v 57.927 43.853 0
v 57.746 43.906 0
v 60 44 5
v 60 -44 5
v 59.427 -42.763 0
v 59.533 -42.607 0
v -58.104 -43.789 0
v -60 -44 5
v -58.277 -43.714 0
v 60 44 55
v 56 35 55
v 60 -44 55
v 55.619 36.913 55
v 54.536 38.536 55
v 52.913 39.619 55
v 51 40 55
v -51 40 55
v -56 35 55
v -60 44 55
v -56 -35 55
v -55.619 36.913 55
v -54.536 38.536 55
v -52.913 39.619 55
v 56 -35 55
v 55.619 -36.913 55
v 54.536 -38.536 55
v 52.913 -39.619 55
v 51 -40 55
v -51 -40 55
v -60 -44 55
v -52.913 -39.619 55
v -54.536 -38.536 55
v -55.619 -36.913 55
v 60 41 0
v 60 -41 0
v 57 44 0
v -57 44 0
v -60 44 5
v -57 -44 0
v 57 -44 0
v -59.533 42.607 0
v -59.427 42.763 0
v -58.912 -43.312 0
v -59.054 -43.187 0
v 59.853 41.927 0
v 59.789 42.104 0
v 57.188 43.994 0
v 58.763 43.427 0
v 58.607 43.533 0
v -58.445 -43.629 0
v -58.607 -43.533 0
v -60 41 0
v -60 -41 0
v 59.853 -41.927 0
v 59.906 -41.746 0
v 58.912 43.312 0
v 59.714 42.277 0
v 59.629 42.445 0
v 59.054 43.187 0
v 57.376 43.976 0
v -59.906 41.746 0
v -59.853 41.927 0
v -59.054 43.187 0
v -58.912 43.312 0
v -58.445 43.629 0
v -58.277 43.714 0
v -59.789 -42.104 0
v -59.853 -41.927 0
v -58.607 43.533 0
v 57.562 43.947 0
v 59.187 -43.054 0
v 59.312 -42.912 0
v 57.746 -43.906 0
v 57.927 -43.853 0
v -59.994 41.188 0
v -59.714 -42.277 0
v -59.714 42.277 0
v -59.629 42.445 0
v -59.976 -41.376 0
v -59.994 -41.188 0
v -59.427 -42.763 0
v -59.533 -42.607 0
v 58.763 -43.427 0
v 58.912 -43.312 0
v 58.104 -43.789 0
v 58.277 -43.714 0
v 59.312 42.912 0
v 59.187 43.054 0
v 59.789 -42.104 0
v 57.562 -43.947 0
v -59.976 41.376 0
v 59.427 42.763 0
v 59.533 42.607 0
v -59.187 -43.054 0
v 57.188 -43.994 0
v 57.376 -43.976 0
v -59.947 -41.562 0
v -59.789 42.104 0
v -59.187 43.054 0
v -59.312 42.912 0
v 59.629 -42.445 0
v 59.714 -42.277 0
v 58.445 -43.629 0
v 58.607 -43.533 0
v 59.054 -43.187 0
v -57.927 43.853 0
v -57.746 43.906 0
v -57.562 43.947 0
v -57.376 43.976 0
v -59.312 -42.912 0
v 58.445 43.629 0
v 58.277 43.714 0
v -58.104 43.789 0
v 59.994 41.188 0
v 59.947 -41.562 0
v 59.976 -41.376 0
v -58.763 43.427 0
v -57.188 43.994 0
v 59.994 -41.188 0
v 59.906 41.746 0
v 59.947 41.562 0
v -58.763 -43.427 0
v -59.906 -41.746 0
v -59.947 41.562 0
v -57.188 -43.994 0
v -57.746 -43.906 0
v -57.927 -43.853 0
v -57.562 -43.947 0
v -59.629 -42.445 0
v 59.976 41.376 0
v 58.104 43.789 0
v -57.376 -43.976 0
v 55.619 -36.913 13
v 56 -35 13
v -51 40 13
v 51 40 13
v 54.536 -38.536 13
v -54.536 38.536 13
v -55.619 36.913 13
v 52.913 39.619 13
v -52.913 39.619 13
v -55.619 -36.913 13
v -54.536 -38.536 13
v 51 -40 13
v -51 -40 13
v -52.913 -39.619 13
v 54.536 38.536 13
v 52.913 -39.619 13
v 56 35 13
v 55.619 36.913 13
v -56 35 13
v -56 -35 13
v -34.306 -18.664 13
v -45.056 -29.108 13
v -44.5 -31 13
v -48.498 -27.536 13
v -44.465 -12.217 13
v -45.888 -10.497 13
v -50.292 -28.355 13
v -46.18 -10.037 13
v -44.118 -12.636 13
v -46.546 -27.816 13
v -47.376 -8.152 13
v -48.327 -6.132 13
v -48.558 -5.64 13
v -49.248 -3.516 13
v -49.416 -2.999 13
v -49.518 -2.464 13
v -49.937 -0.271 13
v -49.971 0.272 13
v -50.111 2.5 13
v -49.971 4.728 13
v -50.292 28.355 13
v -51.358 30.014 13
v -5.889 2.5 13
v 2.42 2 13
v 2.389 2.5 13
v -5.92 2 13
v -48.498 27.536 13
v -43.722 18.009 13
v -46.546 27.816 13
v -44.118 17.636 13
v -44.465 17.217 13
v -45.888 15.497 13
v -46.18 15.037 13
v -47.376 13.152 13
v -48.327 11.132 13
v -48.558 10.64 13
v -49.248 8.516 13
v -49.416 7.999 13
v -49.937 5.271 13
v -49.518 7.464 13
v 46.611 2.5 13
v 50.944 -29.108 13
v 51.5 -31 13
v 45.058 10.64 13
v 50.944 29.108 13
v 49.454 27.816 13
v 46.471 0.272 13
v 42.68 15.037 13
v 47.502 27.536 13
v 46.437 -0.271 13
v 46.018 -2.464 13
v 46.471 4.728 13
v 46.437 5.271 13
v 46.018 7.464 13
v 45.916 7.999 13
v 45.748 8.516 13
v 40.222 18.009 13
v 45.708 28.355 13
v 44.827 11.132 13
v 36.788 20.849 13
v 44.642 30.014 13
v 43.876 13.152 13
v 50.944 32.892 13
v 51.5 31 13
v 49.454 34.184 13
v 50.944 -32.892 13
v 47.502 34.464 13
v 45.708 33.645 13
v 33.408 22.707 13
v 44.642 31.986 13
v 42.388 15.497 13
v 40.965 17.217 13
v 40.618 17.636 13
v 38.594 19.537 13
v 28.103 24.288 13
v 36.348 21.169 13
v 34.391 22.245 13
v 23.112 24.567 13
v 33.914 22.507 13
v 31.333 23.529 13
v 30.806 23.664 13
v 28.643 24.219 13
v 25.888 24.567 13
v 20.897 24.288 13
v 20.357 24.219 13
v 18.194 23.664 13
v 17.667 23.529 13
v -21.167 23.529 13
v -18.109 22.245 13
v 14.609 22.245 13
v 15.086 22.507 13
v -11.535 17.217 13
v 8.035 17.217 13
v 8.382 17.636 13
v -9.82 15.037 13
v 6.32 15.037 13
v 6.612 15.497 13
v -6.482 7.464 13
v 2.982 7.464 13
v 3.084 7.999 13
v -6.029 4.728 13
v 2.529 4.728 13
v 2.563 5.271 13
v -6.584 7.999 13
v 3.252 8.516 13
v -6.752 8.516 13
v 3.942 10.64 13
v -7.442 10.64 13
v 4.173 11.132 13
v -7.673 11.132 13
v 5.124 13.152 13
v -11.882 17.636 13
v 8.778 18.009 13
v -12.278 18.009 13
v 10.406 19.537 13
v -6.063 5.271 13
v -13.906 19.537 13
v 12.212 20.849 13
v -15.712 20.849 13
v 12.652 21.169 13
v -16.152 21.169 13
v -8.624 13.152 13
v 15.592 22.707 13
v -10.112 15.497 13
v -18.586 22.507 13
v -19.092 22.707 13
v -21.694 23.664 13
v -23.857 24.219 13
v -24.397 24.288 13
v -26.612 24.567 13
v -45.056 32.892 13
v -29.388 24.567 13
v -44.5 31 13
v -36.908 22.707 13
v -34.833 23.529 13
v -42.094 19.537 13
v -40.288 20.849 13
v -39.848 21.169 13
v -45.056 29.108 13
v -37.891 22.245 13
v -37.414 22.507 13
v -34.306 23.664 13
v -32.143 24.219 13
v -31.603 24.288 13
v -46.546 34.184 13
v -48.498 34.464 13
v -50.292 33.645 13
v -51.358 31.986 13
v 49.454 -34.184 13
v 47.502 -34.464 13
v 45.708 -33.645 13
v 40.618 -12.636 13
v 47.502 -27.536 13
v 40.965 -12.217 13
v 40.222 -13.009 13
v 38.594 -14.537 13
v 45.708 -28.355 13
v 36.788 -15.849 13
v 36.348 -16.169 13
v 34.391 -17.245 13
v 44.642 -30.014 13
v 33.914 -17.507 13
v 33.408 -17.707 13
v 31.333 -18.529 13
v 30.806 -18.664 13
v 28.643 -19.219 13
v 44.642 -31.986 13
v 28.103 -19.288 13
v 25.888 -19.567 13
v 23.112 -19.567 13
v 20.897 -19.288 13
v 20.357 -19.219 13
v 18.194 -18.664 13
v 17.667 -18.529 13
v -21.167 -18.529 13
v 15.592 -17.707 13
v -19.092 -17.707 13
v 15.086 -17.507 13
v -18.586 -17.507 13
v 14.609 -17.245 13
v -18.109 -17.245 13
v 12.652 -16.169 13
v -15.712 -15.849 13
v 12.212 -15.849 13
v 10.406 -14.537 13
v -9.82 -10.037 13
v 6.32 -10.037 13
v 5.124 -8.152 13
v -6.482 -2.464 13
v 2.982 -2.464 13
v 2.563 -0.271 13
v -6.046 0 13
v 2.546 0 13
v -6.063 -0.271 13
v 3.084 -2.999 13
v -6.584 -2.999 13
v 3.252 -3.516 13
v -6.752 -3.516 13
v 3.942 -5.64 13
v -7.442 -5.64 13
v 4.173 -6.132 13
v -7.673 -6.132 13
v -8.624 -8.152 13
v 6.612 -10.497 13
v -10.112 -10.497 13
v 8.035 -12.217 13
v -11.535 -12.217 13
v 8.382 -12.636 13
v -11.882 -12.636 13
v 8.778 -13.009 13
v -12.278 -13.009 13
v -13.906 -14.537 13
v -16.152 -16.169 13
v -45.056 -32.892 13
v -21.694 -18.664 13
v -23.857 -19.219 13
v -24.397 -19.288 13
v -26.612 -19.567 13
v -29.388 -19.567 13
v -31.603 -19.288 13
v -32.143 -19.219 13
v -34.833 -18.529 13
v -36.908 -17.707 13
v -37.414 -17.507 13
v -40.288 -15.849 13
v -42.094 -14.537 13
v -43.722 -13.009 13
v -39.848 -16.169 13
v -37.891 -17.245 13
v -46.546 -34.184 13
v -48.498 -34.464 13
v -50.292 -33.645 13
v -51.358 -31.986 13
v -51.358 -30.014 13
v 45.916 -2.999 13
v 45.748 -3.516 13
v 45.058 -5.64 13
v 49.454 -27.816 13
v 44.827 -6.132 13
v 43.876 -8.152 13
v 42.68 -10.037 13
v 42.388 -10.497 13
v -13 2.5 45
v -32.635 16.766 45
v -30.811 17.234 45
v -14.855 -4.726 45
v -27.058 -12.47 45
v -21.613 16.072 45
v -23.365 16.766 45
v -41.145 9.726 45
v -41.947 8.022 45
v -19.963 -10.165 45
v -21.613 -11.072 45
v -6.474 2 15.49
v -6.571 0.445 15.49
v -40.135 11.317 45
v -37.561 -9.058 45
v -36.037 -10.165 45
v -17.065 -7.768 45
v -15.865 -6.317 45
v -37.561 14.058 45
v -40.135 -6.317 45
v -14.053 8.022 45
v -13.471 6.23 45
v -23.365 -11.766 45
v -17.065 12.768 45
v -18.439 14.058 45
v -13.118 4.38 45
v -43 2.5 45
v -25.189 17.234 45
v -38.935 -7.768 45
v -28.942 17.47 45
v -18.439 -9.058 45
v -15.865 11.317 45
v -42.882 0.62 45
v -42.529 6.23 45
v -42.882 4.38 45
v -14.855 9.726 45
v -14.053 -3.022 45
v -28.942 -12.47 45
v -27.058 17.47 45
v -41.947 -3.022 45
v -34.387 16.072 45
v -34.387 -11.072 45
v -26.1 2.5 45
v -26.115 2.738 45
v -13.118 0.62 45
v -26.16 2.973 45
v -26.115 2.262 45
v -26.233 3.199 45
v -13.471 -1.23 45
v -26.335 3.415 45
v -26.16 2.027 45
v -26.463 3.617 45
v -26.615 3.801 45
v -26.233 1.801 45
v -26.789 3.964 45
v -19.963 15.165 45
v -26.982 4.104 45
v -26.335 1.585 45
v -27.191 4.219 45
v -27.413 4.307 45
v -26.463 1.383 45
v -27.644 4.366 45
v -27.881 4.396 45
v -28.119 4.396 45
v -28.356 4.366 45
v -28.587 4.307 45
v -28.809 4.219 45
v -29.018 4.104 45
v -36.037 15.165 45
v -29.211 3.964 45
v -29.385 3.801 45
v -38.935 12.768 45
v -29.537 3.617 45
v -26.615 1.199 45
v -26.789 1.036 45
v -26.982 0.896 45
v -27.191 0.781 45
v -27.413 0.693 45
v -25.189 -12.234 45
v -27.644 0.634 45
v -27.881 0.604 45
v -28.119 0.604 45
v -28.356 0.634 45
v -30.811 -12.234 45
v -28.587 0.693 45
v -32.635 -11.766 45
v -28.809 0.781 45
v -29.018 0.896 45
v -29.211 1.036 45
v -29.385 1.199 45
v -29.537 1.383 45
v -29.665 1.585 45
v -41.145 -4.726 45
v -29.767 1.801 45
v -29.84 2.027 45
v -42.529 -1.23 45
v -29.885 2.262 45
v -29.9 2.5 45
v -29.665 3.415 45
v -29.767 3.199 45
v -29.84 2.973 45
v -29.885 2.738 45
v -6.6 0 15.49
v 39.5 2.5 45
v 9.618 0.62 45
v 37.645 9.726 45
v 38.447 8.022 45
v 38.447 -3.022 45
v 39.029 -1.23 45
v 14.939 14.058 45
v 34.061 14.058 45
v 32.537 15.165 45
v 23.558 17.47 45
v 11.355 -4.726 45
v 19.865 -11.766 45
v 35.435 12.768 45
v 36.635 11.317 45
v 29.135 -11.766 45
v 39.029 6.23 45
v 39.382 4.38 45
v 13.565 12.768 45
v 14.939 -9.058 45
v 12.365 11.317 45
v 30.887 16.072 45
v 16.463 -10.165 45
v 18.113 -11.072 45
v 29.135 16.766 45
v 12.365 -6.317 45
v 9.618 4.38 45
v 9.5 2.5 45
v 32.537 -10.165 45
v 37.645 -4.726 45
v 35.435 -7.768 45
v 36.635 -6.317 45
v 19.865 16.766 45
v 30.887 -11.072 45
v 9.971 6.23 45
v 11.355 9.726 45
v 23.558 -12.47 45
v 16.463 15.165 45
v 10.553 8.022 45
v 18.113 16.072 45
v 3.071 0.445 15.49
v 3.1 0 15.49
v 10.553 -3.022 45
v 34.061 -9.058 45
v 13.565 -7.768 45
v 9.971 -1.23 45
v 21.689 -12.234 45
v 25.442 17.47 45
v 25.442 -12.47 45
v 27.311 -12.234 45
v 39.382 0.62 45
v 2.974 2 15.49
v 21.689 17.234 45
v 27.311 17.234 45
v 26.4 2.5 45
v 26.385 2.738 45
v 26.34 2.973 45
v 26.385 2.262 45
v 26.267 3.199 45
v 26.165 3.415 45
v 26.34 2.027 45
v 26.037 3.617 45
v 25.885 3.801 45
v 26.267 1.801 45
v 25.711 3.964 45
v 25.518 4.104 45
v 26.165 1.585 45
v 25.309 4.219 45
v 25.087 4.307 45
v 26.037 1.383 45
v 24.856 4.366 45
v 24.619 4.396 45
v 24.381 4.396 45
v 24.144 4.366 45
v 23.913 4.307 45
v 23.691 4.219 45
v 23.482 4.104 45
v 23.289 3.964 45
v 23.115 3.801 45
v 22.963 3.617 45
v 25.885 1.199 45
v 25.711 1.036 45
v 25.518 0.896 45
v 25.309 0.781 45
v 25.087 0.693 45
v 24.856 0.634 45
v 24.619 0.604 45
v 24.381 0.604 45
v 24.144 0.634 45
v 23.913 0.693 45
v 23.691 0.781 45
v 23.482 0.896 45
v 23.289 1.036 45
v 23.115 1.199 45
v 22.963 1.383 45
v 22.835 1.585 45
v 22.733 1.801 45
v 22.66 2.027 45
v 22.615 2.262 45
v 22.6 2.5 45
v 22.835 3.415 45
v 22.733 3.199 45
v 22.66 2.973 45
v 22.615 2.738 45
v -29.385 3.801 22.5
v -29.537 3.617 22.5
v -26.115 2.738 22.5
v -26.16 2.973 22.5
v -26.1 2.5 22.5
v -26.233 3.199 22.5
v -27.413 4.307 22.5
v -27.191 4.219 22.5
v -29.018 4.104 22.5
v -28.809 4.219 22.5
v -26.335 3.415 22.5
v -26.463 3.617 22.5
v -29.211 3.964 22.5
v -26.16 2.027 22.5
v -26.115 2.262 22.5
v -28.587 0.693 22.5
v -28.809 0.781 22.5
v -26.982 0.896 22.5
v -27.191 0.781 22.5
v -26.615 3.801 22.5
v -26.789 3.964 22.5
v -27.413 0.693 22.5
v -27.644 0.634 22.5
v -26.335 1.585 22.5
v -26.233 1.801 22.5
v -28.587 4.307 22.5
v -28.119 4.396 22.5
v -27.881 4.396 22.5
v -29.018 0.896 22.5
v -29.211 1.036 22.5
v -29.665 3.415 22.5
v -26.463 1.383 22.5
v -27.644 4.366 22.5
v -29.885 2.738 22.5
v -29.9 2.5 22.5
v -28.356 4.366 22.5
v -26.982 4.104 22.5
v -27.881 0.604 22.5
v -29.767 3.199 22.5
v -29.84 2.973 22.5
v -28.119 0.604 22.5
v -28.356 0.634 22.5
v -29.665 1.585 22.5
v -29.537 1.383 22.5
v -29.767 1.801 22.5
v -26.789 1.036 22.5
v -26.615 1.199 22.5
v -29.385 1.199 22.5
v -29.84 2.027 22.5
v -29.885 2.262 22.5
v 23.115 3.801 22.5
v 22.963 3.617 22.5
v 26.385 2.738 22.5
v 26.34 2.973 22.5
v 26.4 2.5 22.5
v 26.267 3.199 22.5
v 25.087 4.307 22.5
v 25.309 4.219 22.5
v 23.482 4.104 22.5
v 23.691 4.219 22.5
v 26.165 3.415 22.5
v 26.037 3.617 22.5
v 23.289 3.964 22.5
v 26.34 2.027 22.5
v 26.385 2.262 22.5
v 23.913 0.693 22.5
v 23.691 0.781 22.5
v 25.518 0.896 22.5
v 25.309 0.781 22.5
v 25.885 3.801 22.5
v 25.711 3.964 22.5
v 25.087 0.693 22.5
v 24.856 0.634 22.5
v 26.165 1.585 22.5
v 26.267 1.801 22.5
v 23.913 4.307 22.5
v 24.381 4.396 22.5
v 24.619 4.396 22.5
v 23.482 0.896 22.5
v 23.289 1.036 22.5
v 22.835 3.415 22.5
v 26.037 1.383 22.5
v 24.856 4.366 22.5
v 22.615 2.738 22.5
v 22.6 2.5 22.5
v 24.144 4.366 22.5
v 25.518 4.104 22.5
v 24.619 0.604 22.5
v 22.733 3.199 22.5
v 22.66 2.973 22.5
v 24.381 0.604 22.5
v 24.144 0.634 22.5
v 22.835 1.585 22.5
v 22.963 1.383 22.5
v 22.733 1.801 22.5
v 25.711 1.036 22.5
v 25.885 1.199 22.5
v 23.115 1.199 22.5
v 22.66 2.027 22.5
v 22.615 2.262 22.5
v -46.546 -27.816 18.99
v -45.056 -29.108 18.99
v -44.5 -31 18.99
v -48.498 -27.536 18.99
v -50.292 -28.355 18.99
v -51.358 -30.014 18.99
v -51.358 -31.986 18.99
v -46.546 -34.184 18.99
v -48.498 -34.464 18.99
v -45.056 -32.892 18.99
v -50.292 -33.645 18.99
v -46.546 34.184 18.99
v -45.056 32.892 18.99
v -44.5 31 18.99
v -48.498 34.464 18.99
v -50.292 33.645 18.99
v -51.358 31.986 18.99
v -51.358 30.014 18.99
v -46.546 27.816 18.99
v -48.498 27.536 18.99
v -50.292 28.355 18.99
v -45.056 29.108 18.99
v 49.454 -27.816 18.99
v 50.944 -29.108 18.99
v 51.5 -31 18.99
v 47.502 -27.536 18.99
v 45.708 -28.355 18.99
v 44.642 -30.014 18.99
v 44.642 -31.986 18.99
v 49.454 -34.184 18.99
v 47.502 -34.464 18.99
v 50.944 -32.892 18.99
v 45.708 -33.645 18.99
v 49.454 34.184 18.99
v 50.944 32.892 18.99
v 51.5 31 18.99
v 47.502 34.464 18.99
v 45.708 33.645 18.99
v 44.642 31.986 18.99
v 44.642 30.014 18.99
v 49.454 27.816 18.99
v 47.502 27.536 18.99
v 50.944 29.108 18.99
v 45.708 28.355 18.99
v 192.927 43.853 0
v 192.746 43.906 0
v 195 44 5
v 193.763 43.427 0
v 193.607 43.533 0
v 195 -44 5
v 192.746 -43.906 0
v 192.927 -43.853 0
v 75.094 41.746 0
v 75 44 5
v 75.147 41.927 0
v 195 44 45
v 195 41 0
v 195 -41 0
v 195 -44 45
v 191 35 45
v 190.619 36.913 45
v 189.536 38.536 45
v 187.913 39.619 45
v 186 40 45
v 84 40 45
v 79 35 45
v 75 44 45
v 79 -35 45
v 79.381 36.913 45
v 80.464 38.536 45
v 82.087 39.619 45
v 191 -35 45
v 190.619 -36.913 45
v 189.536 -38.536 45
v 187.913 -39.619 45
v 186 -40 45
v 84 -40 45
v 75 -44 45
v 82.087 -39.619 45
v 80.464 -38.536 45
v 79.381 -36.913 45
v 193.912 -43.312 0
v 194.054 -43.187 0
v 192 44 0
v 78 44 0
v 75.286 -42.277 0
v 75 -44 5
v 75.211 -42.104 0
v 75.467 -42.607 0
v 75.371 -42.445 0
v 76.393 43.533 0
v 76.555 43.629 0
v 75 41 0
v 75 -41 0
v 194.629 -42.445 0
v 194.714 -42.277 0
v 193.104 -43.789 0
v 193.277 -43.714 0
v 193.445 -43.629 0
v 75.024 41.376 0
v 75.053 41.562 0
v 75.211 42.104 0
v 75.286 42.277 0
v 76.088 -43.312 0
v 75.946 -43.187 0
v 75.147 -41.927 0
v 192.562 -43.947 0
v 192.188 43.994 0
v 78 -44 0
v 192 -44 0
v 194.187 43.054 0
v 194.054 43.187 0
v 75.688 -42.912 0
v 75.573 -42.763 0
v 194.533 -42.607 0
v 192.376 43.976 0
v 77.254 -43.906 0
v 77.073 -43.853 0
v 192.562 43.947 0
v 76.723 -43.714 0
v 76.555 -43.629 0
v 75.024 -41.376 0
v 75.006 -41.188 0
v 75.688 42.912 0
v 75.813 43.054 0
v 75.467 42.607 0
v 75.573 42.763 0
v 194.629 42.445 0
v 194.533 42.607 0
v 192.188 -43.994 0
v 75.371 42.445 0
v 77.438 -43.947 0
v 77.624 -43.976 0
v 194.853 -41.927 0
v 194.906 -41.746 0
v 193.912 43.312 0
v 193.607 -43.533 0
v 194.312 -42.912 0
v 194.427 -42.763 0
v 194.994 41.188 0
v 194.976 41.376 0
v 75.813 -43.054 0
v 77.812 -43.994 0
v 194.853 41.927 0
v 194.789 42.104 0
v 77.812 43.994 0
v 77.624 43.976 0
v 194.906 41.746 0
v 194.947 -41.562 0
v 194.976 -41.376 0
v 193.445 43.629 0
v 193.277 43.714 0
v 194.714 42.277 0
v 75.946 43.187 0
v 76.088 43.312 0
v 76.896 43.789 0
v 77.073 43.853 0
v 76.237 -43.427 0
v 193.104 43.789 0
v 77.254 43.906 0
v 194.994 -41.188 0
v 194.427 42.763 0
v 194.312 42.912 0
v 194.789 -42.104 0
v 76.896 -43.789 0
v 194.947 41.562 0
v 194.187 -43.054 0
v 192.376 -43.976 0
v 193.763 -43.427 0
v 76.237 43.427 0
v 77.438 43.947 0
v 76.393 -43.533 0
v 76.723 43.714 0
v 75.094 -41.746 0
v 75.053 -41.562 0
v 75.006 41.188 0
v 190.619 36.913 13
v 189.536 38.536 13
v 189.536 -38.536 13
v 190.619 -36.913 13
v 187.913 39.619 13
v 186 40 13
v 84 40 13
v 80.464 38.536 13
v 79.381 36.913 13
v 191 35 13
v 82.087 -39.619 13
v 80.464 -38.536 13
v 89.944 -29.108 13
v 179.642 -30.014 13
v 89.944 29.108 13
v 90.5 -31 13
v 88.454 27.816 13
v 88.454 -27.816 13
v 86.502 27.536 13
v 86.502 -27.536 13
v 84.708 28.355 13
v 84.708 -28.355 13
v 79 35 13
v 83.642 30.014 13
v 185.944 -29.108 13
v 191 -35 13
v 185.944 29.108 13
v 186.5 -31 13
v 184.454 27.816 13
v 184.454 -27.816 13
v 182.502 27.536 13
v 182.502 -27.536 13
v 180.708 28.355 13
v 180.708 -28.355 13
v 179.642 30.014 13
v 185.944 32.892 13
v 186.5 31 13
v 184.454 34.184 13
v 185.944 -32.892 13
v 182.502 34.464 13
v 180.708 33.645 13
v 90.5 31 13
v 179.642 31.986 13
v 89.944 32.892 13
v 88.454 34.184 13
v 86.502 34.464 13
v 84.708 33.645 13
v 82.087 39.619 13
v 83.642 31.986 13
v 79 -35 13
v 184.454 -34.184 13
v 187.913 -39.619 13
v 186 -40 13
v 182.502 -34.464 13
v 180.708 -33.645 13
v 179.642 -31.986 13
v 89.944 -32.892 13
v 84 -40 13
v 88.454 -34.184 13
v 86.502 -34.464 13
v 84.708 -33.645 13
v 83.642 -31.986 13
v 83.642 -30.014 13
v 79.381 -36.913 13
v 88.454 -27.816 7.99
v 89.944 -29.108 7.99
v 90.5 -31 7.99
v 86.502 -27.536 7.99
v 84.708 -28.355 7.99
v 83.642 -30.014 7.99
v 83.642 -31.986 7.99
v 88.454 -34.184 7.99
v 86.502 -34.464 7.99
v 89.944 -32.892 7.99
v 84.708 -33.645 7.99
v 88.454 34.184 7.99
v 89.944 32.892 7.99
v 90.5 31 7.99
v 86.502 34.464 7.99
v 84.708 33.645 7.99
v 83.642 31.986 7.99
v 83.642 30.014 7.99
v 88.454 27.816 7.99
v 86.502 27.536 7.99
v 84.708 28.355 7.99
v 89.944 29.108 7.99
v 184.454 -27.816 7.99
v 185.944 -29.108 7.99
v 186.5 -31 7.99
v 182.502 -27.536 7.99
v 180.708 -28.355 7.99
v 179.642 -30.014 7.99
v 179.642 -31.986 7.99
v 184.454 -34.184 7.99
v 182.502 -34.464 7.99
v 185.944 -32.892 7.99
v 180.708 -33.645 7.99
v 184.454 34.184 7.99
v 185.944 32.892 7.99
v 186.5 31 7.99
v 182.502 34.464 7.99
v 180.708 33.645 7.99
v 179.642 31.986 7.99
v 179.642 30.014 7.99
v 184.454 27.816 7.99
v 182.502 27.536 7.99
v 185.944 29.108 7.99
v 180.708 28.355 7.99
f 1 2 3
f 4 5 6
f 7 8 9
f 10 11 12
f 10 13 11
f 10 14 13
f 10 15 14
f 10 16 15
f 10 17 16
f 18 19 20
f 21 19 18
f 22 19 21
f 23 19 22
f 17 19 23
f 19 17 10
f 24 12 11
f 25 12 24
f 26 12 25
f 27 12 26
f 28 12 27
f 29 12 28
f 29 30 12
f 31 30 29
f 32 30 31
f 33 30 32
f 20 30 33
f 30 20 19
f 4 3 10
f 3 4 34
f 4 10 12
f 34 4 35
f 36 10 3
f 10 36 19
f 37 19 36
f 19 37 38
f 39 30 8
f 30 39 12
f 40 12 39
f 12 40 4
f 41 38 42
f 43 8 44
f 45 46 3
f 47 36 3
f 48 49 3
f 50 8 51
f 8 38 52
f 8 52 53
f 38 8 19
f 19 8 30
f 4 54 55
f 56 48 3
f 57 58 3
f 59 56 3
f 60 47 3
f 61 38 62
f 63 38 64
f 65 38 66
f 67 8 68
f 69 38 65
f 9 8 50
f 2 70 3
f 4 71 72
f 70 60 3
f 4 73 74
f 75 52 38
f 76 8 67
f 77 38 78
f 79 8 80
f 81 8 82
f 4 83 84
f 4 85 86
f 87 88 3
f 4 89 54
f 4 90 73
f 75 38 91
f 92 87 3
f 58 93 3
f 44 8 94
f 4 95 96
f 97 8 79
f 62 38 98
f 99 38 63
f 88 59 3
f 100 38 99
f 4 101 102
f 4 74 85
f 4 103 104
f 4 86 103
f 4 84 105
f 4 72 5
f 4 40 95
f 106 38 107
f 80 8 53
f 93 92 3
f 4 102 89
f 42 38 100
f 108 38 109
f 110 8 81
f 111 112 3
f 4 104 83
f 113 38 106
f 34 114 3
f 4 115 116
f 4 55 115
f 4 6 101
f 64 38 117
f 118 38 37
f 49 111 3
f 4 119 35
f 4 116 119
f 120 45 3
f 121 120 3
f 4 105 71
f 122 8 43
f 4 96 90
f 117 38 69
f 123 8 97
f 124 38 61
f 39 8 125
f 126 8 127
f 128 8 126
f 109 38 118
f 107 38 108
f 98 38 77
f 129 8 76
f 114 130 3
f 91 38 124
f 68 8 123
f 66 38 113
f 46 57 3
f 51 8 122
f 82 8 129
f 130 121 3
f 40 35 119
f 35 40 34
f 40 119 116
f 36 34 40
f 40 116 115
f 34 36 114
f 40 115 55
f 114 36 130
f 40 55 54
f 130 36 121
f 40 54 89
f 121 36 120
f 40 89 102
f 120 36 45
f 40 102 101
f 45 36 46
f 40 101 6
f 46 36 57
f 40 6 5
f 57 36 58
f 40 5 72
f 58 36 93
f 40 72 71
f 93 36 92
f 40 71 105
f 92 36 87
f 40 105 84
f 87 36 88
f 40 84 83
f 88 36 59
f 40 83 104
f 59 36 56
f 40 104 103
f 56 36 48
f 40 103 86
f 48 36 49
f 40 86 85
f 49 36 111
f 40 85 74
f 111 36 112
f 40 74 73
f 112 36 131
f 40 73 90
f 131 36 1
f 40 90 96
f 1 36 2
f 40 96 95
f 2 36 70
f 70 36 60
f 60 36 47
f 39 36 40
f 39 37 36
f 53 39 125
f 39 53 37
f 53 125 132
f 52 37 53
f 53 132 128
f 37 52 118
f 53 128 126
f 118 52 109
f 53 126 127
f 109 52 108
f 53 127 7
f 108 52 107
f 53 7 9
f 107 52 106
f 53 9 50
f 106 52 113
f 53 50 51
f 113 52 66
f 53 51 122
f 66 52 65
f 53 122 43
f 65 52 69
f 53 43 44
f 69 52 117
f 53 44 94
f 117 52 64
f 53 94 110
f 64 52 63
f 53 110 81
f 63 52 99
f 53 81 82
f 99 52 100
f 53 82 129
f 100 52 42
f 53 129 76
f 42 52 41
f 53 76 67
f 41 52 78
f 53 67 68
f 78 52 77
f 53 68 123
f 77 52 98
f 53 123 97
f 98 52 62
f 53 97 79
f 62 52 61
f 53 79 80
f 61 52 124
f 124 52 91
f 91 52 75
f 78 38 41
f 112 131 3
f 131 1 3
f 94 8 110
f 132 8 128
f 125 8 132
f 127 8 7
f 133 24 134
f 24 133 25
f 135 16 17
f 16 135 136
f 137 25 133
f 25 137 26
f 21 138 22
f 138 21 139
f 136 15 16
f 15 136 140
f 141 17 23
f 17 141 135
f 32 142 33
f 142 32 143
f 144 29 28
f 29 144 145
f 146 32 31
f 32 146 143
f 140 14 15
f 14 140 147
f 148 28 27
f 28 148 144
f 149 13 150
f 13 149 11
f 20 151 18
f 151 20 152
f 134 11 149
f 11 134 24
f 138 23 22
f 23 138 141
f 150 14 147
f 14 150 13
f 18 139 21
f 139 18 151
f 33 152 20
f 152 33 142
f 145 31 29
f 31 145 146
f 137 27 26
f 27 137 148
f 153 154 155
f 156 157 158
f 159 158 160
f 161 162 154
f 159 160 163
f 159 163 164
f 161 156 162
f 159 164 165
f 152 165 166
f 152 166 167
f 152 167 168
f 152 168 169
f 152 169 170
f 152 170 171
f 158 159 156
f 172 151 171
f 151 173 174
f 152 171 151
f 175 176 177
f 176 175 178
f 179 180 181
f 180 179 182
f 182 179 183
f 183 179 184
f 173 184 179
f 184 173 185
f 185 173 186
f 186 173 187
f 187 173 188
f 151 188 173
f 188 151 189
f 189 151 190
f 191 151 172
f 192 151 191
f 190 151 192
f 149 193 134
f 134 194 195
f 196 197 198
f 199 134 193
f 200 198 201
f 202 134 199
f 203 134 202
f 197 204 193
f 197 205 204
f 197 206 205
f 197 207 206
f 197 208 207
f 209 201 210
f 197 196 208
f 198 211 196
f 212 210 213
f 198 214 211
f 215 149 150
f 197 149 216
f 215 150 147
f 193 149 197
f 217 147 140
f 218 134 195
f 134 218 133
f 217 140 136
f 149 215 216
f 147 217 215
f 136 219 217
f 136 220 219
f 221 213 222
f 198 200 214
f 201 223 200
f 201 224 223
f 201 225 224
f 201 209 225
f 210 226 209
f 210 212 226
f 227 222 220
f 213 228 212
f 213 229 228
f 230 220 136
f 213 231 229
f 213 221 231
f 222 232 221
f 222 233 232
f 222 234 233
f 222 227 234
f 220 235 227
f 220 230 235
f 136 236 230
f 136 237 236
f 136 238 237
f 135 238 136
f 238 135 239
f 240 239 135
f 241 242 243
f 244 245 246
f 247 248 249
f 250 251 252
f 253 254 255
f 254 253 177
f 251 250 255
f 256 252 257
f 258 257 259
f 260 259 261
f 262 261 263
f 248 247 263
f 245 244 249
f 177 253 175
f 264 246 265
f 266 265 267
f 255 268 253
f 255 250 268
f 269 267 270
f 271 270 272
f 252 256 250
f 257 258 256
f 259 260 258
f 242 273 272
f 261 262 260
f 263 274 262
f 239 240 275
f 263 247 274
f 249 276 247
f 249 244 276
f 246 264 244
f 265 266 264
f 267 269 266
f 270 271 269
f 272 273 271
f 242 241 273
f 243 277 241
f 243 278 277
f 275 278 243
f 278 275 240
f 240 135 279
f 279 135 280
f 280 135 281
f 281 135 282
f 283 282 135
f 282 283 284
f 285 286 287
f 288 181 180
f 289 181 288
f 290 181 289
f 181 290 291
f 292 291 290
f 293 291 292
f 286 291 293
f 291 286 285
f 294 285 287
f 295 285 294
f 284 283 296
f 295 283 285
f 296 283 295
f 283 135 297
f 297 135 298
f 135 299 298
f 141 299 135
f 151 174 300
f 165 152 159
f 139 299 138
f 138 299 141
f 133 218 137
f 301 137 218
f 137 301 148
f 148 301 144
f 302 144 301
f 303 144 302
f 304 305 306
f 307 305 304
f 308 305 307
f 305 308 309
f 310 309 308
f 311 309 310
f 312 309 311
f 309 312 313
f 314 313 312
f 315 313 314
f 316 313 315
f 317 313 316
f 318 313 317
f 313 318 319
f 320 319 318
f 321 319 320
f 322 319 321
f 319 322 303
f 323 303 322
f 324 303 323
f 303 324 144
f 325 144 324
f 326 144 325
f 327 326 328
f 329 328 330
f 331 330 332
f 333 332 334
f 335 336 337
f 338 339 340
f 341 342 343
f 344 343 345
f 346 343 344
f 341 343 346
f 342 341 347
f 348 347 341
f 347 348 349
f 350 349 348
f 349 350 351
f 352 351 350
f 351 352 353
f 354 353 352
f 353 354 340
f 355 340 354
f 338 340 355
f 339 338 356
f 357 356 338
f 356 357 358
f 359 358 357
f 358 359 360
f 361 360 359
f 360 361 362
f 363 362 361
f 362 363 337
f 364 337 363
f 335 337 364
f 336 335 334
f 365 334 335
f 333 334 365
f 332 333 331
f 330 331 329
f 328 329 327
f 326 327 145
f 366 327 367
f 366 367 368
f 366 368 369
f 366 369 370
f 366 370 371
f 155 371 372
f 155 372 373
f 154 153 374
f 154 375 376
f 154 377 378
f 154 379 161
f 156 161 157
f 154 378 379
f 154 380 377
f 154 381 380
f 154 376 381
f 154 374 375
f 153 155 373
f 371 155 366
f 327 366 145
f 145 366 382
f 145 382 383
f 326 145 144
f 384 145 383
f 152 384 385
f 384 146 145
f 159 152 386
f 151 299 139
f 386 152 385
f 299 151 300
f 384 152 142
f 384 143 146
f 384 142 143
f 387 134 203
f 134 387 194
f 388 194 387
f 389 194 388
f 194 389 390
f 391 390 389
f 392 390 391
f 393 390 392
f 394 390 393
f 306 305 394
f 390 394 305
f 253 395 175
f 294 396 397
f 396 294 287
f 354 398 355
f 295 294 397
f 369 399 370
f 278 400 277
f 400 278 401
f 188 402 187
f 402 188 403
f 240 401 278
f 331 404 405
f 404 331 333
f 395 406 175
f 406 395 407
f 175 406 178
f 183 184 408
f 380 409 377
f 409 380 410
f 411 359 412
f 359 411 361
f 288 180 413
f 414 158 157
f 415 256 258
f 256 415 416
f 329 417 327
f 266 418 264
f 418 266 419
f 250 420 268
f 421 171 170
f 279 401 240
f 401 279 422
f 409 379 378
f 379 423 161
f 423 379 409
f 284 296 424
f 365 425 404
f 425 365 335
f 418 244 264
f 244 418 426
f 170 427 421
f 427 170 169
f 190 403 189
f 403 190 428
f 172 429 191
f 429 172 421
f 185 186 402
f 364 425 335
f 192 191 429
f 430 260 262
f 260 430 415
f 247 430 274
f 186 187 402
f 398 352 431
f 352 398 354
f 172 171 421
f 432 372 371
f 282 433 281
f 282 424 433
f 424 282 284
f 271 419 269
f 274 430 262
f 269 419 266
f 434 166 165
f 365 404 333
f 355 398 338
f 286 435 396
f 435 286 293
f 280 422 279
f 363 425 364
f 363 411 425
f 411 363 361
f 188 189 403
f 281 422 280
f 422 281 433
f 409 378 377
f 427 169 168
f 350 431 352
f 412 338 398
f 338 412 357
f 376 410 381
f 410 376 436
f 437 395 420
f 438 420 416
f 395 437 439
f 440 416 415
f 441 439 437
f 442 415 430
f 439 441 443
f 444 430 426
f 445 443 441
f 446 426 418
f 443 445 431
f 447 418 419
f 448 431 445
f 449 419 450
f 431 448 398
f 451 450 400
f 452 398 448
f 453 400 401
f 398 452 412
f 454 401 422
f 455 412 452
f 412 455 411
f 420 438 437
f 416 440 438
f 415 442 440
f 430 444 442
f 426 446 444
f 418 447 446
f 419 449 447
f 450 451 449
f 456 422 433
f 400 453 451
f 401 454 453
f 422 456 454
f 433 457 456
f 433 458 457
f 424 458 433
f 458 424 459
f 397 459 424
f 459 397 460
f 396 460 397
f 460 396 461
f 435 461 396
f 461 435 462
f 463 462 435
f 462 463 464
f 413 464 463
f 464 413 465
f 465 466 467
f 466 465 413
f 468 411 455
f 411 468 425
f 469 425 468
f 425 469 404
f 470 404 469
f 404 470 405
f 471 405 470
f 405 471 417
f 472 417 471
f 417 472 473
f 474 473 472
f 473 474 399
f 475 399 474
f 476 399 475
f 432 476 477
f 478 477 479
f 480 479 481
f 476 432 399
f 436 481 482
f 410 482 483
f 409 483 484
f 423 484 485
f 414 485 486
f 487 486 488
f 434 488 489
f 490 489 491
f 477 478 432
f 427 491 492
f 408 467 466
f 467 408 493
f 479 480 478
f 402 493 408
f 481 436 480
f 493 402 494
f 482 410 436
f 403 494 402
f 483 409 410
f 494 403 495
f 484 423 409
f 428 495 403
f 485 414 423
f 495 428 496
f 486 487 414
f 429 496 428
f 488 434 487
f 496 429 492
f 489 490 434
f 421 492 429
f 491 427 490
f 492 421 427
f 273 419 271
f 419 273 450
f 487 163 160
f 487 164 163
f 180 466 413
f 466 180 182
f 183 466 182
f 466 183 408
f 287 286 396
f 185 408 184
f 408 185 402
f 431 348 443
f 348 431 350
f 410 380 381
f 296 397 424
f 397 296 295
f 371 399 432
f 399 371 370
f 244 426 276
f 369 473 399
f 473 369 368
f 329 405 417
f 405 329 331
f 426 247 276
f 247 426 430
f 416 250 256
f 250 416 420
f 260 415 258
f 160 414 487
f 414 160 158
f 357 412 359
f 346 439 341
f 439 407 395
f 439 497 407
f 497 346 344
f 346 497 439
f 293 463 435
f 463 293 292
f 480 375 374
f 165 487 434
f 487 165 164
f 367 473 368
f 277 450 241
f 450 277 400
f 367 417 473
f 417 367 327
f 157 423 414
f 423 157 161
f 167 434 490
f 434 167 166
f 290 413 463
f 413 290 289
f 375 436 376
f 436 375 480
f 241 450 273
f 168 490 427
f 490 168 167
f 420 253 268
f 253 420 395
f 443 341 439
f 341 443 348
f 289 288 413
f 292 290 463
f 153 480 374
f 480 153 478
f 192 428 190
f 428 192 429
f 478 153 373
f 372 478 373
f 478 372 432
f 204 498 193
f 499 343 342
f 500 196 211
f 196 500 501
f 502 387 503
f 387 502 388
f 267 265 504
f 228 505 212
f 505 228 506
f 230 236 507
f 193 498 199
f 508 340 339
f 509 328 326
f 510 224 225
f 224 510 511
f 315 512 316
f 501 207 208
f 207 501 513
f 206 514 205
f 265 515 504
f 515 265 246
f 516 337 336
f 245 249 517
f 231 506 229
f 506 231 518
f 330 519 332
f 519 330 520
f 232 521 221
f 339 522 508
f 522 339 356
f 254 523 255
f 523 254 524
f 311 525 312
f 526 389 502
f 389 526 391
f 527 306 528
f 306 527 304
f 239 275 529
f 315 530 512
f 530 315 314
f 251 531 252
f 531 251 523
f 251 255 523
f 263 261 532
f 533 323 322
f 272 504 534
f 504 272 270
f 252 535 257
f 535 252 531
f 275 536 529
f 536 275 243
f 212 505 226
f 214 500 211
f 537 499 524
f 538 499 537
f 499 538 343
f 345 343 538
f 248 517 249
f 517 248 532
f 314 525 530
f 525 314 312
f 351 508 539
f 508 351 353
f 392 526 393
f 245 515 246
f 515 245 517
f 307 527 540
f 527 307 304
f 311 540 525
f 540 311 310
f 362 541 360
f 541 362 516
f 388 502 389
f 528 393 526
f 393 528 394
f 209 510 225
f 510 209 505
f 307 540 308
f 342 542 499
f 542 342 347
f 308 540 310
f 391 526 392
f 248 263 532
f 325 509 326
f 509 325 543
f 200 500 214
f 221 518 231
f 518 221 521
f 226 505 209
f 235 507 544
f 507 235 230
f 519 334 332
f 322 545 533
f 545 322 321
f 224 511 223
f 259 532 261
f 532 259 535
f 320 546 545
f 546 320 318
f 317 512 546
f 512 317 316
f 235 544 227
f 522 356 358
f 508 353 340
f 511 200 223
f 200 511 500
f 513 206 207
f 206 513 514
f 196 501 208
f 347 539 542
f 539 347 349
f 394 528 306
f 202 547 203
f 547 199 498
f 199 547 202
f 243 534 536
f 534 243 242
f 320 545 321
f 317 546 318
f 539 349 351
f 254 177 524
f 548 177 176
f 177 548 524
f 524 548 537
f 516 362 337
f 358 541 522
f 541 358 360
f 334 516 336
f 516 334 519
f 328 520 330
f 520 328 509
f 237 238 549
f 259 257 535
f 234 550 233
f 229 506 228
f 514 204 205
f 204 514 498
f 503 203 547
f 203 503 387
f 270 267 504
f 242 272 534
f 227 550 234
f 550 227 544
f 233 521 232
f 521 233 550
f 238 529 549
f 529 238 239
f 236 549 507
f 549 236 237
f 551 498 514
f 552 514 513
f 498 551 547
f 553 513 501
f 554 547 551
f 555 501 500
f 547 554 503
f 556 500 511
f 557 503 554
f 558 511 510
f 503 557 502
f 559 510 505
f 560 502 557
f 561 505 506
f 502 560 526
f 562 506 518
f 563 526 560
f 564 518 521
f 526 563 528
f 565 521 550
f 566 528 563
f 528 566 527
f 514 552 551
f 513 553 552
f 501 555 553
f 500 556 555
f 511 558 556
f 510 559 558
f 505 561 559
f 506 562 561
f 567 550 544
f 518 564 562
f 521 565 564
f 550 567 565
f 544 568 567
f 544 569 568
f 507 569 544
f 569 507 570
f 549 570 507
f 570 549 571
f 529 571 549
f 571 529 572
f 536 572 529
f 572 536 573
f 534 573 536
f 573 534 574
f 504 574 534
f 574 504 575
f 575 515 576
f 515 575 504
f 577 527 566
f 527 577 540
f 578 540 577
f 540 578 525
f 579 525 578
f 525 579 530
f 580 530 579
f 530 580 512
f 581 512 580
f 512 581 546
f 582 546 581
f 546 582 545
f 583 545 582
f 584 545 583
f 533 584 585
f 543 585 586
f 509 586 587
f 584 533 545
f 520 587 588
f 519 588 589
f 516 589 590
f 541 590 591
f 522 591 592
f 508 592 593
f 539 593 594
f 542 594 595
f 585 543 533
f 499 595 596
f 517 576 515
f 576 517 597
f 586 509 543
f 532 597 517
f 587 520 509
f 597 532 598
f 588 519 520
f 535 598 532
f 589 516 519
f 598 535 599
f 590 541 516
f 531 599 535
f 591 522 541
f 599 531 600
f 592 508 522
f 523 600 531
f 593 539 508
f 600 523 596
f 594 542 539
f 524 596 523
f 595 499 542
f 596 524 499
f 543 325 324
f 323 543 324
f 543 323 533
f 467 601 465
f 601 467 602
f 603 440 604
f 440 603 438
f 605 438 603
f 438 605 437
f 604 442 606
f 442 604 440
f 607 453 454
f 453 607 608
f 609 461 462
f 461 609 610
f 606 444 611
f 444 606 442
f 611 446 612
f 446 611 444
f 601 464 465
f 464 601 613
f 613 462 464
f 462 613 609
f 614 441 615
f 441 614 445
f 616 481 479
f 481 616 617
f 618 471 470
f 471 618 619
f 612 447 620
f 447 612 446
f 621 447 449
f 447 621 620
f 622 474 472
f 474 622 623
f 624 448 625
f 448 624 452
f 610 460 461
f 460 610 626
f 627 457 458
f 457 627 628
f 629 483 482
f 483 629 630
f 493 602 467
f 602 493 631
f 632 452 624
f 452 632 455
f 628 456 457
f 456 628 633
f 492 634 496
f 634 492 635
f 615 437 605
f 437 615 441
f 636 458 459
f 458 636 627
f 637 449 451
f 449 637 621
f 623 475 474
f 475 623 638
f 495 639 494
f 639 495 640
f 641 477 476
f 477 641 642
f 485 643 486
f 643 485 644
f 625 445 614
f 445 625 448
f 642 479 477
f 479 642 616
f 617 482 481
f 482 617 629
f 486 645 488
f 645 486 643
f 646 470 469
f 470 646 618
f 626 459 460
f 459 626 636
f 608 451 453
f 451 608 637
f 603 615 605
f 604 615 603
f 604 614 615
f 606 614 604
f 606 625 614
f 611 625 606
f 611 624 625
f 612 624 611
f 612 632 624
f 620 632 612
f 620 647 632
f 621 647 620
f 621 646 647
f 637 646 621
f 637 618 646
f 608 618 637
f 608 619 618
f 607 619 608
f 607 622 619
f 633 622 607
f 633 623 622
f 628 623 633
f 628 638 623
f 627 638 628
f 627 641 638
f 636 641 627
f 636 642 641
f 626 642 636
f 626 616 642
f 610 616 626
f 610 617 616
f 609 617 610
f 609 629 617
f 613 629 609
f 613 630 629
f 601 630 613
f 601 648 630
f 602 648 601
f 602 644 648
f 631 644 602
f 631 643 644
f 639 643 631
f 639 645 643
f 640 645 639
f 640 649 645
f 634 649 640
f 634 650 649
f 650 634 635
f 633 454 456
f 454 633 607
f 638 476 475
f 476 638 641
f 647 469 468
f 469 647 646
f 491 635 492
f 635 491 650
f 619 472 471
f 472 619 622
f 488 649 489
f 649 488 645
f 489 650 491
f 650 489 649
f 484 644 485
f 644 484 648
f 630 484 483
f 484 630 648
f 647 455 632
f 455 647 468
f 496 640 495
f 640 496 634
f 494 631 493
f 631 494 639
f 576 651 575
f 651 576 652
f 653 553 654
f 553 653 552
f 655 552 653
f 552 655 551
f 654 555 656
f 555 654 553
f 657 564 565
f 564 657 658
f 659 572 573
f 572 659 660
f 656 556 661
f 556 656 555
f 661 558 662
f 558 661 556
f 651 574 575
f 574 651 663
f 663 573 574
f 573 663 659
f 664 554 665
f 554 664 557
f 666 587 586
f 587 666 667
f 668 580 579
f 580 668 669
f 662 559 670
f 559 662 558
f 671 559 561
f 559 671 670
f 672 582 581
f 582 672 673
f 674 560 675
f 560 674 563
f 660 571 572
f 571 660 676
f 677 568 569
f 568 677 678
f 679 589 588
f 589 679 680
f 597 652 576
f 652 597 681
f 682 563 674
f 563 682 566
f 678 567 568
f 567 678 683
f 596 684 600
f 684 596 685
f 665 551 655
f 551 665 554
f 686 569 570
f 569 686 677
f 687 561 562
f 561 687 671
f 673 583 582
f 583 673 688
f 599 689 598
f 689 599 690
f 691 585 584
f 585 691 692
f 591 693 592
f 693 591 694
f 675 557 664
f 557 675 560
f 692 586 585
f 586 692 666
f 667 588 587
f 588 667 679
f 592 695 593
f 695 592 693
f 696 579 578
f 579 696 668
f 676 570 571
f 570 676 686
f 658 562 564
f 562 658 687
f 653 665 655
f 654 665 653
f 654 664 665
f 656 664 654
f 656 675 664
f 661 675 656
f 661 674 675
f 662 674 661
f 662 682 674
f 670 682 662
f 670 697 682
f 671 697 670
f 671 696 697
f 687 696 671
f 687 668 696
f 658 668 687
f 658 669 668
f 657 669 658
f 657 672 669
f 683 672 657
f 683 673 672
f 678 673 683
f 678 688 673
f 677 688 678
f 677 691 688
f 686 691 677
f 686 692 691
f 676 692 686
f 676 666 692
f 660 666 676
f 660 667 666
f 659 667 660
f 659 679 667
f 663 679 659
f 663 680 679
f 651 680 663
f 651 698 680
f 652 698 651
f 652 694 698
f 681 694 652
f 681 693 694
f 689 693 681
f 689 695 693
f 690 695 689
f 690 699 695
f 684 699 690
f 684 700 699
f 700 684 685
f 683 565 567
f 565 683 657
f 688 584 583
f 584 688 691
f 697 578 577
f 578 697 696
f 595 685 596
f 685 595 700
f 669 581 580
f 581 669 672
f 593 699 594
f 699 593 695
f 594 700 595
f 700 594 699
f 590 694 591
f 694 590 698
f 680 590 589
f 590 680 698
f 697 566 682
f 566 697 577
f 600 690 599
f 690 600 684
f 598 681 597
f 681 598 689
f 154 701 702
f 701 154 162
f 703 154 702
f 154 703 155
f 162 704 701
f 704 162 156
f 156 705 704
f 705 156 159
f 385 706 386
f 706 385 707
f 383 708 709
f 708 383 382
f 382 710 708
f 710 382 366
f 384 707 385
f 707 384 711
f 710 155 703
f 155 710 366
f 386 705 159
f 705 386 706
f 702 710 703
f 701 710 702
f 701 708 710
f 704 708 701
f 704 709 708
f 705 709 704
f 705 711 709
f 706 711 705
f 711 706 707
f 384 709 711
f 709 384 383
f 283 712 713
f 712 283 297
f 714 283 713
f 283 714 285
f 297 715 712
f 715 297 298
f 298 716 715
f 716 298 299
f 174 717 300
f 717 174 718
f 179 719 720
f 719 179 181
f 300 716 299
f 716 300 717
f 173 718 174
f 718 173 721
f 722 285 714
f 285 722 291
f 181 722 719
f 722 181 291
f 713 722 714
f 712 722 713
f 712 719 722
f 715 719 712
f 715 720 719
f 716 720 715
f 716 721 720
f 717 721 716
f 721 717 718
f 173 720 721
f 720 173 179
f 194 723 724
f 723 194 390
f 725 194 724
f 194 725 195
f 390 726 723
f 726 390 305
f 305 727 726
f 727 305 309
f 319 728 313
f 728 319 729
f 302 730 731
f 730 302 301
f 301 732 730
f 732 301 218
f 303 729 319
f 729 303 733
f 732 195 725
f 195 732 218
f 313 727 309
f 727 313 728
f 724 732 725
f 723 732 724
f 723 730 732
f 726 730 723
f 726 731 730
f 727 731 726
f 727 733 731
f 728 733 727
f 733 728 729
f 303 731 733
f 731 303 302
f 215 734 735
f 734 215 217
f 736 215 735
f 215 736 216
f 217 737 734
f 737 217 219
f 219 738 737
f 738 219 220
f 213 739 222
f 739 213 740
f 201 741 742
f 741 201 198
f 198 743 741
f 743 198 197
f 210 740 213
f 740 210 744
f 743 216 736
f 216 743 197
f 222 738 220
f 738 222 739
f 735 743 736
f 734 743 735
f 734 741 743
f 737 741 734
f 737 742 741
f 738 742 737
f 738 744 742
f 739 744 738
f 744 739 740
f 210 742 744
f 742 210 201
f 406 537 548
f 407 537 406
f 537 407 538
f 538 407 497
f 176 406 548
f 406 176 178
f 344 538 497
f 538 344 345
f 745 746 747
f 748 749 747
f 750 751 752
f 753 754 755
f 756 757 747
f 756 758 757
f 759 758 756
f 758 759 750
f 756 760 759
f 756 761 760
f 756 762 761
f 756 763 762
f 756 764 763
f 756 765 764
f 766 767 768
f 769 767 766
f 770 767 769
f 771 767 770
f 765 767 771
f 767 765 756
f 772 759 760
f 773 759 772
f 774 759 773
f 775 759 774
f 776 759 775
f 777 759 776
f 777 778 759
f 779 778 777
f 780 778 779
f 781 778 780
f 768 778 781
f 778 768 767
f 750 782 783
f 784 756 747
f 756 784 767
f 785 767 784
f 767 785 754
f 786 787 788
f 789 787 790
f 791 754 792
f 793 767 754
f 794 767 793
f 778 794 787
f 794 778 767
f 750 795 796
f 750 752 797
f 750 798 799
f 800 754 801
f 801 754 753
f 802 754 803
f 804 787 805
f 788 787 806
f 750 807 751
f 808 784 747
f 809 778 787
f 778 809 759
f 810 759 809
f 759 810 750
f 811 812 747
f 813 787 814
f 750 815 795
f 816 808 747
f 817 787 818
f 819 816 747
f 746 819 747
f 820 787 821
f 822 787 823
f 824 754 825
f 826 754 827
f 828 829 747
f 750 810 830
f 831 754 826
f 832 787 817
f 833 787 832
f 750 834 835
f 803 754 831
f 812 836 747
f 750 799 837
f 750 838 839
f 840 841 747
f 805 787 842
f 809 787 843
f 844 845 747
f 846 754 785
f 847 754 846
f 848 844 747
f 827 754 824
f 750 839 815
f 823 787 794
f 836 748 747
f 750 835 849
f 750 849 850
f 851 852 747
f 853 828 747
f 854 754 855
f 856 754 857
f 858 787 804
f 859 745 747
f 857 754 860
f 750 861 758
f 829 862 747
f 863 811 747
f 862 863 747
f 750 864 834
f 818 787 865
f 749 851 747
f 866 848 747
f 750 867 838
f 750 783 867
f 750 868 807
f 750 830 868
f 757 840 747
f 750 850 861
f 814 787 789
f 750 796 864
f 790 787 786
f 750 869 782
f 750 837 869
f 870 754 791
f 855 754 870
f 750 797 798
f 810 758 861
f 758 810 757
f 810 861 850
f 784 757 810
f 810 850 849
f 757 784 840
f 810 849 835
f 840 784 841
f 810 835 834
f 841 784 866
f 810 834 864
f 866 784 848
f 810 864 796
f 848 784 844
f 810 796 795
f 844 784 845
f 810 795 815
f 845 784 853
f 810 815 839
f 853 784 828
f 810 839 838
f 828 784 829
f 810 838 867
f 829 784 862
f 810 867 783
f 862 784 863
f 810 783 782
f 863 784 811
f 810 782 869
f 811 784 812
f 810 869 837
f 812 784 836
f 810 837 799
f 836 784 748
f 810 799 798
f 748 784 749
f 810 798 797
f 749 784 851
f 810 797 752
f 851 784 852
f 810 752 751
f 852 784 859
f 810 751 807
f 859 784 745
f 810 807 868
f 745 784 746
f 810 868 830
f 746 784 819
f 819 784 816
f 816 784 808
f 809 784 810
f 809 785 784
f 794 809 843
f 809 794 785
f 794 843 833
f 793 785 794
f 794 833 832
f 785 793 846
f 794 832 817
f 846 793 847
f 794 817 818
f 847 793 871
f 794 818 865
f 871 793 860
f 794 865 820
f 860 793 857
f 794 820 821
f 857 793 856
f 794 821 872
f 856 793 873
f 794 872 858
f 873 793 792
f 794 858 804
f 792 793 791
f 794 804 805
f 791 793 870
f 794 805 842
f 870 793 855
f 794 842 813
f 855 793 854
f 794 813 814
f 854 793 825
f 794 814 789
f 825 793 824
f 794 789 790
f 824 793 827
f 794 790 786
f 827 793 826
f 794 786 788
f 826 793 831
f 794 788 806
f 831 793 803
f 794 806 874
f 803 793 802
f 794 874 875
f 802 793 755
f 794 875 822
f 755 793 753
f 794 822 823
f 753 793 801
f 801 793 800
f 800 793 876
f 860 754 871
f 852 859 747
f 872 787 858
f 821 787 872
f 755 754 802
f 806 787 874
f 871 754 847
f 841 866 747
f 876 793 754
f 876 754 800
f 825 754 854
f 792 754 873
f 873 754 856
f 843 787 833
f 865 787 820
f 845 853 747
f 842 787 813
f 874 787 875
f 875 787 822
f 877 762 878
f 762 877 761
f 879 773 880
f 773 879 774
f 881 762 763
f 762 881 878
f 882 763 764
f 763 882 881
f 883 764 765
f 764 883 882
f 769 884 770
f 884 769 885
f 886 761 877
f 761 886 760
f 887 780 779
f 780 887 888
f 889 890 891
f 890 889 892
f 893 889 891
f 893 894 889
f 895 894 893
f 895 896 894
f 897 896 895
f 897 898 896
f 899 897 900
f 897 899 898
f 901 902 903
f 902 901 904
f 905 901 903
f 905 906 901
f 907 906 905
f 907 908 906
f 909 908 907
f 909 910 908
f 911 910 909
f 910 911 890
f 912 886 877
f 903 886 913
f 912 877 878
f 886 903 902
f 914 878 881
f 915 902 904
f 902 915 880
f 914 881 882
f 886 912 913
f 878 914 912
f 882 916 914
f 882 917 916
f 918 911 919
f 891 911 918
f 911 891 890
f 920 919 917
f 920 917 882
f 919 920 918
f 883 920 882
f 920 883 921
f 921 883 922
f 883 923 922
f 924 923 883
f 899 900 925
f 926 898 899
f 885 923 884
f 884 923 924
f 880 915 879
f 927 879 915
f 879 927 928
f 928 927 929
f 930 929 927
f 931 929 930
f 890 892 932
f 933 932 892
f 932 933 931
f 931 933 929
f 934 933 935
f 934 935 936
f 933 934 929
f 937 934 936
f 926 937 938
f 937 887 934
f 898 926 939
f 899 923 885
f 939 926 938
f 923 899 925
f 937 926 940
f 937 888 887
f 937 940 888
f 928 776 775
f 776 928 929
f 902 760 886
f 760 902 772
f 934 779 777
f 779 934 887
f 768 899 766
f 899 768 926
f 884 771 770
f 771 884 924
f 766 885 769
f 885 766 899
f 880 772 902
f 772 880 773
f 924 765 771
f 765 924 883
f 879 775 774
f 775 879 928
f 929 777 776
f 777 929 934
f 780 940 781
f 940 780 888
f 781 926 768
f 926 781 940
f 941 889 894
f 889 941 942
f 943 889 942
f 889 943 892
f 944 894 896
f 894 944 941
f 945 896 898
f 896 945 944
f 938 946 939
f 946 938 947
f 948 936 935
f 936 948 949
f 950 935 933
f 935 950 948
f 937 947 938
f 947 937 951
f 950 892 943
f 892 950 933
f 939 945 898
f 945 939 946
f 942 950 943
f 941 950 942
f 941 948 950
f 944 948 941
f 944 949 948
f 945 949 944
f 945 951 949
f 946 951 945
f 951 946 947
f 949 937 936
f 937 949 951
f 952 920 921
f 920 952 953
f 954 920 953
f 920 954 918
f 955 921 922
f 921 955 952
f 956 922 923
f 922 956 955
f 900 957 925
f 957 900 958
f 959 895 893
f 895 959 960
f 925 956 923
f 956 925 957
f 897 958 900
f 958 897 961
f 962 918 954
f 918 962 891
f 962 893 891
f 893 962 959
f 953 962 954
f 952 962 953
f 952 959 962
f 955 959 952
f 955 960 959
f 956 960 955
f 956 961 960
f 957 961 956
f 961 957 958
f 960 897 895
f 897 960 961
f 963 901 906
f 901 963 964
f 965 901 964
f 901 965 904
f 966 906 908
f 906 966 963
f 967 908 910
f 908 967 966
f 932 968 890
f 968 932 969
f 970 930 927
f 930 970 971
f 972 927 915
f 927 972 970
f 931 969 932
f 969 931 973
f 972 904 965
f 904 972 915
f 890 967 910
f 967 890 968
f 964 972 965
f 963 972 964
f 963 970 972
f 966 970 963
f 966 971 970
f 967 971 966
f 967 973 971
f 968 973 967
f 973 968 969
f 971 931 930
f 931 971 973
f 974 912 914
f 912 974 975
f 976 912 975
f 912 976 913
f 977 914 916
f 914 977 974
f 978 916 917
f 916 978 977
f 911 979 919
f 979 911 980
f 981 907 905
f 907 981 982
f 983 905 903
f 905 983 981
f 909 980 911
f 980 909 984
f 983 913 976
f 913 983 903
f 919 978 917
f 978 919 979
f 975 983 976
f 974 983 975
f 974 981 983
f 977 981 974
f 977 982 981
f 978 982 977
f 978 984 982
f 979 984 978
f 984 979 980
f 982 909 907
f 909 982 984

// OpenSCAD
// file: ../src/spool_holder_feet.scad
// parametric spool holder
// author Free Beachler for Terawatt Industries

w = 60;
l = 60;
elev = 45;
bott_r = 25;
top_r = 15;
m4_diameter = 4 - 0.2;	//self-tapping for M4

spool_holder_feet(w, l, elev, bott_r, top_r, m4_diameter);

module spool_holder_feet(w, l, e, rb, rt, m4d) {
	difference() {
		spool_hoder_feet_base(w, l, e, rb, rt, m4d);
		translate([0, 0, e / 2]) spool_holder_feet_screw_holes_positive(w, l, e, m4d);
	}
}

module spool_hoder_feet_base(w, l, e, rb, rt, m4d) {
	for (x = [0, w - 15 * 0.5]) {
		for (y = [l - 15 * 0.5]) {
			translate([x, y, 0]) cylinder(r1 = rb, r2 = rt, h = e, $fn=50);
		}
	}
//	translate([w - 15 * 0.5, 0, 0]) cylinder(r = rb, r2 = rt, h = e, $fn=50);
}

module spool_holder_feet_screw_holes_positive(w, l, e, m4d) {
	for (x = [0, w - 15 * 0.5]) {
		for (y = [l - 15 * 0.5]) {
			translate([x, y, 0]) cylinder(r = m4d / 2, h = e, $fn=50);
		}
	}
//	translate([w - 15 * 0.5, 0, 0]) cylinder(r = m4d / 2, h = e, $fn=50);
}
// file: parametric_box.scad
// parametric box w/lid
// author:  free beachler
// license:  CC 3.0 Share-Alike w/Attribution

base_thickness = 7.5;
wall_thickness = 4.5;
inside_height = 30;	// box height, not including base
width = 70;
leadout = 70;

box_with_inset_lid(base_thickness, wall_thickness, inside_height, width, leadout);

module box_with_inset_lid(bt, wt, h, w, l, hand) {
	box(bt, wt, h, w, l, hand);
	inset_lid(wt, h, w, l);
}

module box(bt, wt, h, w, l) {
	difference() {
		hull() {
		minkowski() {
			translate([-w / 2 + 3, -l / 2 + 3, 0]) cube([w - 3 * 2, l - 3 * 2, bt]);
			cylinder(r = 3, h = 0.01, center = false, $fn = 100);
		}
			translate([-w / 2, -l / 2, bt]) cube([w, l, h]);
		}
		// rounded corners inside
		minkowski() {
			translate([-w / 2 + wt / 2 + 5, -l / 2 + wt / 2 + 5, wt + bt]) cube([w - wt - 5 * 2, l - wt - 5 * 2, h + bt + wt]);
			cylinder(r = 5, h = 0.01, center = false);
		}
	}
}

module inset_lid(wt, h, w, l) {
	translate([w / 2 + 10, -l / 2 + 5, 0]) {
		minkowski() {
			cube([w - wt - 5 * 2 - 0.1, l - wt - 5 * 2 - 0.1, 10]);
			cylinder(r = 5, h = 0.01, center = false);
		}
	}
}

module peg_stop(bt) {
	translate([0, 0, bt + 3]) rotate([180, 0, 0]) {
		cylinder(r = 4, h = bt, center = false);
		translate([0, 0, bt]) cylinder(r = 8, h = 3, center = false);
	}
}
// main file
// author: f beachler
// license:  all rights reserved

use <parametric_box.scad>;
use <../src/spool_holder_feet.scad>;

part_1();
part_2();

module part_1() {
	union() {
		box(5, 8, 50, 80 + 40, 48 + 40);
		translate([-28, -50, 0]) spool_holder_feet(60, 60, 45, 25, 15, 4 - 0.2);
	}
	pegs1();
	channels();
}

module part_2() {
	translate([75 + 40 + 20, 0, 0]) {
		% translate([-28, -50, 0]) spool_holder_feet(60, 60, 45, 25, 15, 4 - 0.2);
		difference() {
			box(5, 8, 40, 80 + 40, 48 + 40);
			translate([0, 0, -5]) pegs1();
		}
	}
}

module pegs1() {
	for (x = [-48, 48]) {
		for (y = [-31, 31]) {
			translate([x, y, 13 - 0.01])
			rotate([0, 0, 0]) cylinder(r = 3.5, h = 5 + 1);
		}
	}
}

module channels() {
	translate([-10, 0, 13 - 0.01]) cube([15, 2, 2.5]);
}
